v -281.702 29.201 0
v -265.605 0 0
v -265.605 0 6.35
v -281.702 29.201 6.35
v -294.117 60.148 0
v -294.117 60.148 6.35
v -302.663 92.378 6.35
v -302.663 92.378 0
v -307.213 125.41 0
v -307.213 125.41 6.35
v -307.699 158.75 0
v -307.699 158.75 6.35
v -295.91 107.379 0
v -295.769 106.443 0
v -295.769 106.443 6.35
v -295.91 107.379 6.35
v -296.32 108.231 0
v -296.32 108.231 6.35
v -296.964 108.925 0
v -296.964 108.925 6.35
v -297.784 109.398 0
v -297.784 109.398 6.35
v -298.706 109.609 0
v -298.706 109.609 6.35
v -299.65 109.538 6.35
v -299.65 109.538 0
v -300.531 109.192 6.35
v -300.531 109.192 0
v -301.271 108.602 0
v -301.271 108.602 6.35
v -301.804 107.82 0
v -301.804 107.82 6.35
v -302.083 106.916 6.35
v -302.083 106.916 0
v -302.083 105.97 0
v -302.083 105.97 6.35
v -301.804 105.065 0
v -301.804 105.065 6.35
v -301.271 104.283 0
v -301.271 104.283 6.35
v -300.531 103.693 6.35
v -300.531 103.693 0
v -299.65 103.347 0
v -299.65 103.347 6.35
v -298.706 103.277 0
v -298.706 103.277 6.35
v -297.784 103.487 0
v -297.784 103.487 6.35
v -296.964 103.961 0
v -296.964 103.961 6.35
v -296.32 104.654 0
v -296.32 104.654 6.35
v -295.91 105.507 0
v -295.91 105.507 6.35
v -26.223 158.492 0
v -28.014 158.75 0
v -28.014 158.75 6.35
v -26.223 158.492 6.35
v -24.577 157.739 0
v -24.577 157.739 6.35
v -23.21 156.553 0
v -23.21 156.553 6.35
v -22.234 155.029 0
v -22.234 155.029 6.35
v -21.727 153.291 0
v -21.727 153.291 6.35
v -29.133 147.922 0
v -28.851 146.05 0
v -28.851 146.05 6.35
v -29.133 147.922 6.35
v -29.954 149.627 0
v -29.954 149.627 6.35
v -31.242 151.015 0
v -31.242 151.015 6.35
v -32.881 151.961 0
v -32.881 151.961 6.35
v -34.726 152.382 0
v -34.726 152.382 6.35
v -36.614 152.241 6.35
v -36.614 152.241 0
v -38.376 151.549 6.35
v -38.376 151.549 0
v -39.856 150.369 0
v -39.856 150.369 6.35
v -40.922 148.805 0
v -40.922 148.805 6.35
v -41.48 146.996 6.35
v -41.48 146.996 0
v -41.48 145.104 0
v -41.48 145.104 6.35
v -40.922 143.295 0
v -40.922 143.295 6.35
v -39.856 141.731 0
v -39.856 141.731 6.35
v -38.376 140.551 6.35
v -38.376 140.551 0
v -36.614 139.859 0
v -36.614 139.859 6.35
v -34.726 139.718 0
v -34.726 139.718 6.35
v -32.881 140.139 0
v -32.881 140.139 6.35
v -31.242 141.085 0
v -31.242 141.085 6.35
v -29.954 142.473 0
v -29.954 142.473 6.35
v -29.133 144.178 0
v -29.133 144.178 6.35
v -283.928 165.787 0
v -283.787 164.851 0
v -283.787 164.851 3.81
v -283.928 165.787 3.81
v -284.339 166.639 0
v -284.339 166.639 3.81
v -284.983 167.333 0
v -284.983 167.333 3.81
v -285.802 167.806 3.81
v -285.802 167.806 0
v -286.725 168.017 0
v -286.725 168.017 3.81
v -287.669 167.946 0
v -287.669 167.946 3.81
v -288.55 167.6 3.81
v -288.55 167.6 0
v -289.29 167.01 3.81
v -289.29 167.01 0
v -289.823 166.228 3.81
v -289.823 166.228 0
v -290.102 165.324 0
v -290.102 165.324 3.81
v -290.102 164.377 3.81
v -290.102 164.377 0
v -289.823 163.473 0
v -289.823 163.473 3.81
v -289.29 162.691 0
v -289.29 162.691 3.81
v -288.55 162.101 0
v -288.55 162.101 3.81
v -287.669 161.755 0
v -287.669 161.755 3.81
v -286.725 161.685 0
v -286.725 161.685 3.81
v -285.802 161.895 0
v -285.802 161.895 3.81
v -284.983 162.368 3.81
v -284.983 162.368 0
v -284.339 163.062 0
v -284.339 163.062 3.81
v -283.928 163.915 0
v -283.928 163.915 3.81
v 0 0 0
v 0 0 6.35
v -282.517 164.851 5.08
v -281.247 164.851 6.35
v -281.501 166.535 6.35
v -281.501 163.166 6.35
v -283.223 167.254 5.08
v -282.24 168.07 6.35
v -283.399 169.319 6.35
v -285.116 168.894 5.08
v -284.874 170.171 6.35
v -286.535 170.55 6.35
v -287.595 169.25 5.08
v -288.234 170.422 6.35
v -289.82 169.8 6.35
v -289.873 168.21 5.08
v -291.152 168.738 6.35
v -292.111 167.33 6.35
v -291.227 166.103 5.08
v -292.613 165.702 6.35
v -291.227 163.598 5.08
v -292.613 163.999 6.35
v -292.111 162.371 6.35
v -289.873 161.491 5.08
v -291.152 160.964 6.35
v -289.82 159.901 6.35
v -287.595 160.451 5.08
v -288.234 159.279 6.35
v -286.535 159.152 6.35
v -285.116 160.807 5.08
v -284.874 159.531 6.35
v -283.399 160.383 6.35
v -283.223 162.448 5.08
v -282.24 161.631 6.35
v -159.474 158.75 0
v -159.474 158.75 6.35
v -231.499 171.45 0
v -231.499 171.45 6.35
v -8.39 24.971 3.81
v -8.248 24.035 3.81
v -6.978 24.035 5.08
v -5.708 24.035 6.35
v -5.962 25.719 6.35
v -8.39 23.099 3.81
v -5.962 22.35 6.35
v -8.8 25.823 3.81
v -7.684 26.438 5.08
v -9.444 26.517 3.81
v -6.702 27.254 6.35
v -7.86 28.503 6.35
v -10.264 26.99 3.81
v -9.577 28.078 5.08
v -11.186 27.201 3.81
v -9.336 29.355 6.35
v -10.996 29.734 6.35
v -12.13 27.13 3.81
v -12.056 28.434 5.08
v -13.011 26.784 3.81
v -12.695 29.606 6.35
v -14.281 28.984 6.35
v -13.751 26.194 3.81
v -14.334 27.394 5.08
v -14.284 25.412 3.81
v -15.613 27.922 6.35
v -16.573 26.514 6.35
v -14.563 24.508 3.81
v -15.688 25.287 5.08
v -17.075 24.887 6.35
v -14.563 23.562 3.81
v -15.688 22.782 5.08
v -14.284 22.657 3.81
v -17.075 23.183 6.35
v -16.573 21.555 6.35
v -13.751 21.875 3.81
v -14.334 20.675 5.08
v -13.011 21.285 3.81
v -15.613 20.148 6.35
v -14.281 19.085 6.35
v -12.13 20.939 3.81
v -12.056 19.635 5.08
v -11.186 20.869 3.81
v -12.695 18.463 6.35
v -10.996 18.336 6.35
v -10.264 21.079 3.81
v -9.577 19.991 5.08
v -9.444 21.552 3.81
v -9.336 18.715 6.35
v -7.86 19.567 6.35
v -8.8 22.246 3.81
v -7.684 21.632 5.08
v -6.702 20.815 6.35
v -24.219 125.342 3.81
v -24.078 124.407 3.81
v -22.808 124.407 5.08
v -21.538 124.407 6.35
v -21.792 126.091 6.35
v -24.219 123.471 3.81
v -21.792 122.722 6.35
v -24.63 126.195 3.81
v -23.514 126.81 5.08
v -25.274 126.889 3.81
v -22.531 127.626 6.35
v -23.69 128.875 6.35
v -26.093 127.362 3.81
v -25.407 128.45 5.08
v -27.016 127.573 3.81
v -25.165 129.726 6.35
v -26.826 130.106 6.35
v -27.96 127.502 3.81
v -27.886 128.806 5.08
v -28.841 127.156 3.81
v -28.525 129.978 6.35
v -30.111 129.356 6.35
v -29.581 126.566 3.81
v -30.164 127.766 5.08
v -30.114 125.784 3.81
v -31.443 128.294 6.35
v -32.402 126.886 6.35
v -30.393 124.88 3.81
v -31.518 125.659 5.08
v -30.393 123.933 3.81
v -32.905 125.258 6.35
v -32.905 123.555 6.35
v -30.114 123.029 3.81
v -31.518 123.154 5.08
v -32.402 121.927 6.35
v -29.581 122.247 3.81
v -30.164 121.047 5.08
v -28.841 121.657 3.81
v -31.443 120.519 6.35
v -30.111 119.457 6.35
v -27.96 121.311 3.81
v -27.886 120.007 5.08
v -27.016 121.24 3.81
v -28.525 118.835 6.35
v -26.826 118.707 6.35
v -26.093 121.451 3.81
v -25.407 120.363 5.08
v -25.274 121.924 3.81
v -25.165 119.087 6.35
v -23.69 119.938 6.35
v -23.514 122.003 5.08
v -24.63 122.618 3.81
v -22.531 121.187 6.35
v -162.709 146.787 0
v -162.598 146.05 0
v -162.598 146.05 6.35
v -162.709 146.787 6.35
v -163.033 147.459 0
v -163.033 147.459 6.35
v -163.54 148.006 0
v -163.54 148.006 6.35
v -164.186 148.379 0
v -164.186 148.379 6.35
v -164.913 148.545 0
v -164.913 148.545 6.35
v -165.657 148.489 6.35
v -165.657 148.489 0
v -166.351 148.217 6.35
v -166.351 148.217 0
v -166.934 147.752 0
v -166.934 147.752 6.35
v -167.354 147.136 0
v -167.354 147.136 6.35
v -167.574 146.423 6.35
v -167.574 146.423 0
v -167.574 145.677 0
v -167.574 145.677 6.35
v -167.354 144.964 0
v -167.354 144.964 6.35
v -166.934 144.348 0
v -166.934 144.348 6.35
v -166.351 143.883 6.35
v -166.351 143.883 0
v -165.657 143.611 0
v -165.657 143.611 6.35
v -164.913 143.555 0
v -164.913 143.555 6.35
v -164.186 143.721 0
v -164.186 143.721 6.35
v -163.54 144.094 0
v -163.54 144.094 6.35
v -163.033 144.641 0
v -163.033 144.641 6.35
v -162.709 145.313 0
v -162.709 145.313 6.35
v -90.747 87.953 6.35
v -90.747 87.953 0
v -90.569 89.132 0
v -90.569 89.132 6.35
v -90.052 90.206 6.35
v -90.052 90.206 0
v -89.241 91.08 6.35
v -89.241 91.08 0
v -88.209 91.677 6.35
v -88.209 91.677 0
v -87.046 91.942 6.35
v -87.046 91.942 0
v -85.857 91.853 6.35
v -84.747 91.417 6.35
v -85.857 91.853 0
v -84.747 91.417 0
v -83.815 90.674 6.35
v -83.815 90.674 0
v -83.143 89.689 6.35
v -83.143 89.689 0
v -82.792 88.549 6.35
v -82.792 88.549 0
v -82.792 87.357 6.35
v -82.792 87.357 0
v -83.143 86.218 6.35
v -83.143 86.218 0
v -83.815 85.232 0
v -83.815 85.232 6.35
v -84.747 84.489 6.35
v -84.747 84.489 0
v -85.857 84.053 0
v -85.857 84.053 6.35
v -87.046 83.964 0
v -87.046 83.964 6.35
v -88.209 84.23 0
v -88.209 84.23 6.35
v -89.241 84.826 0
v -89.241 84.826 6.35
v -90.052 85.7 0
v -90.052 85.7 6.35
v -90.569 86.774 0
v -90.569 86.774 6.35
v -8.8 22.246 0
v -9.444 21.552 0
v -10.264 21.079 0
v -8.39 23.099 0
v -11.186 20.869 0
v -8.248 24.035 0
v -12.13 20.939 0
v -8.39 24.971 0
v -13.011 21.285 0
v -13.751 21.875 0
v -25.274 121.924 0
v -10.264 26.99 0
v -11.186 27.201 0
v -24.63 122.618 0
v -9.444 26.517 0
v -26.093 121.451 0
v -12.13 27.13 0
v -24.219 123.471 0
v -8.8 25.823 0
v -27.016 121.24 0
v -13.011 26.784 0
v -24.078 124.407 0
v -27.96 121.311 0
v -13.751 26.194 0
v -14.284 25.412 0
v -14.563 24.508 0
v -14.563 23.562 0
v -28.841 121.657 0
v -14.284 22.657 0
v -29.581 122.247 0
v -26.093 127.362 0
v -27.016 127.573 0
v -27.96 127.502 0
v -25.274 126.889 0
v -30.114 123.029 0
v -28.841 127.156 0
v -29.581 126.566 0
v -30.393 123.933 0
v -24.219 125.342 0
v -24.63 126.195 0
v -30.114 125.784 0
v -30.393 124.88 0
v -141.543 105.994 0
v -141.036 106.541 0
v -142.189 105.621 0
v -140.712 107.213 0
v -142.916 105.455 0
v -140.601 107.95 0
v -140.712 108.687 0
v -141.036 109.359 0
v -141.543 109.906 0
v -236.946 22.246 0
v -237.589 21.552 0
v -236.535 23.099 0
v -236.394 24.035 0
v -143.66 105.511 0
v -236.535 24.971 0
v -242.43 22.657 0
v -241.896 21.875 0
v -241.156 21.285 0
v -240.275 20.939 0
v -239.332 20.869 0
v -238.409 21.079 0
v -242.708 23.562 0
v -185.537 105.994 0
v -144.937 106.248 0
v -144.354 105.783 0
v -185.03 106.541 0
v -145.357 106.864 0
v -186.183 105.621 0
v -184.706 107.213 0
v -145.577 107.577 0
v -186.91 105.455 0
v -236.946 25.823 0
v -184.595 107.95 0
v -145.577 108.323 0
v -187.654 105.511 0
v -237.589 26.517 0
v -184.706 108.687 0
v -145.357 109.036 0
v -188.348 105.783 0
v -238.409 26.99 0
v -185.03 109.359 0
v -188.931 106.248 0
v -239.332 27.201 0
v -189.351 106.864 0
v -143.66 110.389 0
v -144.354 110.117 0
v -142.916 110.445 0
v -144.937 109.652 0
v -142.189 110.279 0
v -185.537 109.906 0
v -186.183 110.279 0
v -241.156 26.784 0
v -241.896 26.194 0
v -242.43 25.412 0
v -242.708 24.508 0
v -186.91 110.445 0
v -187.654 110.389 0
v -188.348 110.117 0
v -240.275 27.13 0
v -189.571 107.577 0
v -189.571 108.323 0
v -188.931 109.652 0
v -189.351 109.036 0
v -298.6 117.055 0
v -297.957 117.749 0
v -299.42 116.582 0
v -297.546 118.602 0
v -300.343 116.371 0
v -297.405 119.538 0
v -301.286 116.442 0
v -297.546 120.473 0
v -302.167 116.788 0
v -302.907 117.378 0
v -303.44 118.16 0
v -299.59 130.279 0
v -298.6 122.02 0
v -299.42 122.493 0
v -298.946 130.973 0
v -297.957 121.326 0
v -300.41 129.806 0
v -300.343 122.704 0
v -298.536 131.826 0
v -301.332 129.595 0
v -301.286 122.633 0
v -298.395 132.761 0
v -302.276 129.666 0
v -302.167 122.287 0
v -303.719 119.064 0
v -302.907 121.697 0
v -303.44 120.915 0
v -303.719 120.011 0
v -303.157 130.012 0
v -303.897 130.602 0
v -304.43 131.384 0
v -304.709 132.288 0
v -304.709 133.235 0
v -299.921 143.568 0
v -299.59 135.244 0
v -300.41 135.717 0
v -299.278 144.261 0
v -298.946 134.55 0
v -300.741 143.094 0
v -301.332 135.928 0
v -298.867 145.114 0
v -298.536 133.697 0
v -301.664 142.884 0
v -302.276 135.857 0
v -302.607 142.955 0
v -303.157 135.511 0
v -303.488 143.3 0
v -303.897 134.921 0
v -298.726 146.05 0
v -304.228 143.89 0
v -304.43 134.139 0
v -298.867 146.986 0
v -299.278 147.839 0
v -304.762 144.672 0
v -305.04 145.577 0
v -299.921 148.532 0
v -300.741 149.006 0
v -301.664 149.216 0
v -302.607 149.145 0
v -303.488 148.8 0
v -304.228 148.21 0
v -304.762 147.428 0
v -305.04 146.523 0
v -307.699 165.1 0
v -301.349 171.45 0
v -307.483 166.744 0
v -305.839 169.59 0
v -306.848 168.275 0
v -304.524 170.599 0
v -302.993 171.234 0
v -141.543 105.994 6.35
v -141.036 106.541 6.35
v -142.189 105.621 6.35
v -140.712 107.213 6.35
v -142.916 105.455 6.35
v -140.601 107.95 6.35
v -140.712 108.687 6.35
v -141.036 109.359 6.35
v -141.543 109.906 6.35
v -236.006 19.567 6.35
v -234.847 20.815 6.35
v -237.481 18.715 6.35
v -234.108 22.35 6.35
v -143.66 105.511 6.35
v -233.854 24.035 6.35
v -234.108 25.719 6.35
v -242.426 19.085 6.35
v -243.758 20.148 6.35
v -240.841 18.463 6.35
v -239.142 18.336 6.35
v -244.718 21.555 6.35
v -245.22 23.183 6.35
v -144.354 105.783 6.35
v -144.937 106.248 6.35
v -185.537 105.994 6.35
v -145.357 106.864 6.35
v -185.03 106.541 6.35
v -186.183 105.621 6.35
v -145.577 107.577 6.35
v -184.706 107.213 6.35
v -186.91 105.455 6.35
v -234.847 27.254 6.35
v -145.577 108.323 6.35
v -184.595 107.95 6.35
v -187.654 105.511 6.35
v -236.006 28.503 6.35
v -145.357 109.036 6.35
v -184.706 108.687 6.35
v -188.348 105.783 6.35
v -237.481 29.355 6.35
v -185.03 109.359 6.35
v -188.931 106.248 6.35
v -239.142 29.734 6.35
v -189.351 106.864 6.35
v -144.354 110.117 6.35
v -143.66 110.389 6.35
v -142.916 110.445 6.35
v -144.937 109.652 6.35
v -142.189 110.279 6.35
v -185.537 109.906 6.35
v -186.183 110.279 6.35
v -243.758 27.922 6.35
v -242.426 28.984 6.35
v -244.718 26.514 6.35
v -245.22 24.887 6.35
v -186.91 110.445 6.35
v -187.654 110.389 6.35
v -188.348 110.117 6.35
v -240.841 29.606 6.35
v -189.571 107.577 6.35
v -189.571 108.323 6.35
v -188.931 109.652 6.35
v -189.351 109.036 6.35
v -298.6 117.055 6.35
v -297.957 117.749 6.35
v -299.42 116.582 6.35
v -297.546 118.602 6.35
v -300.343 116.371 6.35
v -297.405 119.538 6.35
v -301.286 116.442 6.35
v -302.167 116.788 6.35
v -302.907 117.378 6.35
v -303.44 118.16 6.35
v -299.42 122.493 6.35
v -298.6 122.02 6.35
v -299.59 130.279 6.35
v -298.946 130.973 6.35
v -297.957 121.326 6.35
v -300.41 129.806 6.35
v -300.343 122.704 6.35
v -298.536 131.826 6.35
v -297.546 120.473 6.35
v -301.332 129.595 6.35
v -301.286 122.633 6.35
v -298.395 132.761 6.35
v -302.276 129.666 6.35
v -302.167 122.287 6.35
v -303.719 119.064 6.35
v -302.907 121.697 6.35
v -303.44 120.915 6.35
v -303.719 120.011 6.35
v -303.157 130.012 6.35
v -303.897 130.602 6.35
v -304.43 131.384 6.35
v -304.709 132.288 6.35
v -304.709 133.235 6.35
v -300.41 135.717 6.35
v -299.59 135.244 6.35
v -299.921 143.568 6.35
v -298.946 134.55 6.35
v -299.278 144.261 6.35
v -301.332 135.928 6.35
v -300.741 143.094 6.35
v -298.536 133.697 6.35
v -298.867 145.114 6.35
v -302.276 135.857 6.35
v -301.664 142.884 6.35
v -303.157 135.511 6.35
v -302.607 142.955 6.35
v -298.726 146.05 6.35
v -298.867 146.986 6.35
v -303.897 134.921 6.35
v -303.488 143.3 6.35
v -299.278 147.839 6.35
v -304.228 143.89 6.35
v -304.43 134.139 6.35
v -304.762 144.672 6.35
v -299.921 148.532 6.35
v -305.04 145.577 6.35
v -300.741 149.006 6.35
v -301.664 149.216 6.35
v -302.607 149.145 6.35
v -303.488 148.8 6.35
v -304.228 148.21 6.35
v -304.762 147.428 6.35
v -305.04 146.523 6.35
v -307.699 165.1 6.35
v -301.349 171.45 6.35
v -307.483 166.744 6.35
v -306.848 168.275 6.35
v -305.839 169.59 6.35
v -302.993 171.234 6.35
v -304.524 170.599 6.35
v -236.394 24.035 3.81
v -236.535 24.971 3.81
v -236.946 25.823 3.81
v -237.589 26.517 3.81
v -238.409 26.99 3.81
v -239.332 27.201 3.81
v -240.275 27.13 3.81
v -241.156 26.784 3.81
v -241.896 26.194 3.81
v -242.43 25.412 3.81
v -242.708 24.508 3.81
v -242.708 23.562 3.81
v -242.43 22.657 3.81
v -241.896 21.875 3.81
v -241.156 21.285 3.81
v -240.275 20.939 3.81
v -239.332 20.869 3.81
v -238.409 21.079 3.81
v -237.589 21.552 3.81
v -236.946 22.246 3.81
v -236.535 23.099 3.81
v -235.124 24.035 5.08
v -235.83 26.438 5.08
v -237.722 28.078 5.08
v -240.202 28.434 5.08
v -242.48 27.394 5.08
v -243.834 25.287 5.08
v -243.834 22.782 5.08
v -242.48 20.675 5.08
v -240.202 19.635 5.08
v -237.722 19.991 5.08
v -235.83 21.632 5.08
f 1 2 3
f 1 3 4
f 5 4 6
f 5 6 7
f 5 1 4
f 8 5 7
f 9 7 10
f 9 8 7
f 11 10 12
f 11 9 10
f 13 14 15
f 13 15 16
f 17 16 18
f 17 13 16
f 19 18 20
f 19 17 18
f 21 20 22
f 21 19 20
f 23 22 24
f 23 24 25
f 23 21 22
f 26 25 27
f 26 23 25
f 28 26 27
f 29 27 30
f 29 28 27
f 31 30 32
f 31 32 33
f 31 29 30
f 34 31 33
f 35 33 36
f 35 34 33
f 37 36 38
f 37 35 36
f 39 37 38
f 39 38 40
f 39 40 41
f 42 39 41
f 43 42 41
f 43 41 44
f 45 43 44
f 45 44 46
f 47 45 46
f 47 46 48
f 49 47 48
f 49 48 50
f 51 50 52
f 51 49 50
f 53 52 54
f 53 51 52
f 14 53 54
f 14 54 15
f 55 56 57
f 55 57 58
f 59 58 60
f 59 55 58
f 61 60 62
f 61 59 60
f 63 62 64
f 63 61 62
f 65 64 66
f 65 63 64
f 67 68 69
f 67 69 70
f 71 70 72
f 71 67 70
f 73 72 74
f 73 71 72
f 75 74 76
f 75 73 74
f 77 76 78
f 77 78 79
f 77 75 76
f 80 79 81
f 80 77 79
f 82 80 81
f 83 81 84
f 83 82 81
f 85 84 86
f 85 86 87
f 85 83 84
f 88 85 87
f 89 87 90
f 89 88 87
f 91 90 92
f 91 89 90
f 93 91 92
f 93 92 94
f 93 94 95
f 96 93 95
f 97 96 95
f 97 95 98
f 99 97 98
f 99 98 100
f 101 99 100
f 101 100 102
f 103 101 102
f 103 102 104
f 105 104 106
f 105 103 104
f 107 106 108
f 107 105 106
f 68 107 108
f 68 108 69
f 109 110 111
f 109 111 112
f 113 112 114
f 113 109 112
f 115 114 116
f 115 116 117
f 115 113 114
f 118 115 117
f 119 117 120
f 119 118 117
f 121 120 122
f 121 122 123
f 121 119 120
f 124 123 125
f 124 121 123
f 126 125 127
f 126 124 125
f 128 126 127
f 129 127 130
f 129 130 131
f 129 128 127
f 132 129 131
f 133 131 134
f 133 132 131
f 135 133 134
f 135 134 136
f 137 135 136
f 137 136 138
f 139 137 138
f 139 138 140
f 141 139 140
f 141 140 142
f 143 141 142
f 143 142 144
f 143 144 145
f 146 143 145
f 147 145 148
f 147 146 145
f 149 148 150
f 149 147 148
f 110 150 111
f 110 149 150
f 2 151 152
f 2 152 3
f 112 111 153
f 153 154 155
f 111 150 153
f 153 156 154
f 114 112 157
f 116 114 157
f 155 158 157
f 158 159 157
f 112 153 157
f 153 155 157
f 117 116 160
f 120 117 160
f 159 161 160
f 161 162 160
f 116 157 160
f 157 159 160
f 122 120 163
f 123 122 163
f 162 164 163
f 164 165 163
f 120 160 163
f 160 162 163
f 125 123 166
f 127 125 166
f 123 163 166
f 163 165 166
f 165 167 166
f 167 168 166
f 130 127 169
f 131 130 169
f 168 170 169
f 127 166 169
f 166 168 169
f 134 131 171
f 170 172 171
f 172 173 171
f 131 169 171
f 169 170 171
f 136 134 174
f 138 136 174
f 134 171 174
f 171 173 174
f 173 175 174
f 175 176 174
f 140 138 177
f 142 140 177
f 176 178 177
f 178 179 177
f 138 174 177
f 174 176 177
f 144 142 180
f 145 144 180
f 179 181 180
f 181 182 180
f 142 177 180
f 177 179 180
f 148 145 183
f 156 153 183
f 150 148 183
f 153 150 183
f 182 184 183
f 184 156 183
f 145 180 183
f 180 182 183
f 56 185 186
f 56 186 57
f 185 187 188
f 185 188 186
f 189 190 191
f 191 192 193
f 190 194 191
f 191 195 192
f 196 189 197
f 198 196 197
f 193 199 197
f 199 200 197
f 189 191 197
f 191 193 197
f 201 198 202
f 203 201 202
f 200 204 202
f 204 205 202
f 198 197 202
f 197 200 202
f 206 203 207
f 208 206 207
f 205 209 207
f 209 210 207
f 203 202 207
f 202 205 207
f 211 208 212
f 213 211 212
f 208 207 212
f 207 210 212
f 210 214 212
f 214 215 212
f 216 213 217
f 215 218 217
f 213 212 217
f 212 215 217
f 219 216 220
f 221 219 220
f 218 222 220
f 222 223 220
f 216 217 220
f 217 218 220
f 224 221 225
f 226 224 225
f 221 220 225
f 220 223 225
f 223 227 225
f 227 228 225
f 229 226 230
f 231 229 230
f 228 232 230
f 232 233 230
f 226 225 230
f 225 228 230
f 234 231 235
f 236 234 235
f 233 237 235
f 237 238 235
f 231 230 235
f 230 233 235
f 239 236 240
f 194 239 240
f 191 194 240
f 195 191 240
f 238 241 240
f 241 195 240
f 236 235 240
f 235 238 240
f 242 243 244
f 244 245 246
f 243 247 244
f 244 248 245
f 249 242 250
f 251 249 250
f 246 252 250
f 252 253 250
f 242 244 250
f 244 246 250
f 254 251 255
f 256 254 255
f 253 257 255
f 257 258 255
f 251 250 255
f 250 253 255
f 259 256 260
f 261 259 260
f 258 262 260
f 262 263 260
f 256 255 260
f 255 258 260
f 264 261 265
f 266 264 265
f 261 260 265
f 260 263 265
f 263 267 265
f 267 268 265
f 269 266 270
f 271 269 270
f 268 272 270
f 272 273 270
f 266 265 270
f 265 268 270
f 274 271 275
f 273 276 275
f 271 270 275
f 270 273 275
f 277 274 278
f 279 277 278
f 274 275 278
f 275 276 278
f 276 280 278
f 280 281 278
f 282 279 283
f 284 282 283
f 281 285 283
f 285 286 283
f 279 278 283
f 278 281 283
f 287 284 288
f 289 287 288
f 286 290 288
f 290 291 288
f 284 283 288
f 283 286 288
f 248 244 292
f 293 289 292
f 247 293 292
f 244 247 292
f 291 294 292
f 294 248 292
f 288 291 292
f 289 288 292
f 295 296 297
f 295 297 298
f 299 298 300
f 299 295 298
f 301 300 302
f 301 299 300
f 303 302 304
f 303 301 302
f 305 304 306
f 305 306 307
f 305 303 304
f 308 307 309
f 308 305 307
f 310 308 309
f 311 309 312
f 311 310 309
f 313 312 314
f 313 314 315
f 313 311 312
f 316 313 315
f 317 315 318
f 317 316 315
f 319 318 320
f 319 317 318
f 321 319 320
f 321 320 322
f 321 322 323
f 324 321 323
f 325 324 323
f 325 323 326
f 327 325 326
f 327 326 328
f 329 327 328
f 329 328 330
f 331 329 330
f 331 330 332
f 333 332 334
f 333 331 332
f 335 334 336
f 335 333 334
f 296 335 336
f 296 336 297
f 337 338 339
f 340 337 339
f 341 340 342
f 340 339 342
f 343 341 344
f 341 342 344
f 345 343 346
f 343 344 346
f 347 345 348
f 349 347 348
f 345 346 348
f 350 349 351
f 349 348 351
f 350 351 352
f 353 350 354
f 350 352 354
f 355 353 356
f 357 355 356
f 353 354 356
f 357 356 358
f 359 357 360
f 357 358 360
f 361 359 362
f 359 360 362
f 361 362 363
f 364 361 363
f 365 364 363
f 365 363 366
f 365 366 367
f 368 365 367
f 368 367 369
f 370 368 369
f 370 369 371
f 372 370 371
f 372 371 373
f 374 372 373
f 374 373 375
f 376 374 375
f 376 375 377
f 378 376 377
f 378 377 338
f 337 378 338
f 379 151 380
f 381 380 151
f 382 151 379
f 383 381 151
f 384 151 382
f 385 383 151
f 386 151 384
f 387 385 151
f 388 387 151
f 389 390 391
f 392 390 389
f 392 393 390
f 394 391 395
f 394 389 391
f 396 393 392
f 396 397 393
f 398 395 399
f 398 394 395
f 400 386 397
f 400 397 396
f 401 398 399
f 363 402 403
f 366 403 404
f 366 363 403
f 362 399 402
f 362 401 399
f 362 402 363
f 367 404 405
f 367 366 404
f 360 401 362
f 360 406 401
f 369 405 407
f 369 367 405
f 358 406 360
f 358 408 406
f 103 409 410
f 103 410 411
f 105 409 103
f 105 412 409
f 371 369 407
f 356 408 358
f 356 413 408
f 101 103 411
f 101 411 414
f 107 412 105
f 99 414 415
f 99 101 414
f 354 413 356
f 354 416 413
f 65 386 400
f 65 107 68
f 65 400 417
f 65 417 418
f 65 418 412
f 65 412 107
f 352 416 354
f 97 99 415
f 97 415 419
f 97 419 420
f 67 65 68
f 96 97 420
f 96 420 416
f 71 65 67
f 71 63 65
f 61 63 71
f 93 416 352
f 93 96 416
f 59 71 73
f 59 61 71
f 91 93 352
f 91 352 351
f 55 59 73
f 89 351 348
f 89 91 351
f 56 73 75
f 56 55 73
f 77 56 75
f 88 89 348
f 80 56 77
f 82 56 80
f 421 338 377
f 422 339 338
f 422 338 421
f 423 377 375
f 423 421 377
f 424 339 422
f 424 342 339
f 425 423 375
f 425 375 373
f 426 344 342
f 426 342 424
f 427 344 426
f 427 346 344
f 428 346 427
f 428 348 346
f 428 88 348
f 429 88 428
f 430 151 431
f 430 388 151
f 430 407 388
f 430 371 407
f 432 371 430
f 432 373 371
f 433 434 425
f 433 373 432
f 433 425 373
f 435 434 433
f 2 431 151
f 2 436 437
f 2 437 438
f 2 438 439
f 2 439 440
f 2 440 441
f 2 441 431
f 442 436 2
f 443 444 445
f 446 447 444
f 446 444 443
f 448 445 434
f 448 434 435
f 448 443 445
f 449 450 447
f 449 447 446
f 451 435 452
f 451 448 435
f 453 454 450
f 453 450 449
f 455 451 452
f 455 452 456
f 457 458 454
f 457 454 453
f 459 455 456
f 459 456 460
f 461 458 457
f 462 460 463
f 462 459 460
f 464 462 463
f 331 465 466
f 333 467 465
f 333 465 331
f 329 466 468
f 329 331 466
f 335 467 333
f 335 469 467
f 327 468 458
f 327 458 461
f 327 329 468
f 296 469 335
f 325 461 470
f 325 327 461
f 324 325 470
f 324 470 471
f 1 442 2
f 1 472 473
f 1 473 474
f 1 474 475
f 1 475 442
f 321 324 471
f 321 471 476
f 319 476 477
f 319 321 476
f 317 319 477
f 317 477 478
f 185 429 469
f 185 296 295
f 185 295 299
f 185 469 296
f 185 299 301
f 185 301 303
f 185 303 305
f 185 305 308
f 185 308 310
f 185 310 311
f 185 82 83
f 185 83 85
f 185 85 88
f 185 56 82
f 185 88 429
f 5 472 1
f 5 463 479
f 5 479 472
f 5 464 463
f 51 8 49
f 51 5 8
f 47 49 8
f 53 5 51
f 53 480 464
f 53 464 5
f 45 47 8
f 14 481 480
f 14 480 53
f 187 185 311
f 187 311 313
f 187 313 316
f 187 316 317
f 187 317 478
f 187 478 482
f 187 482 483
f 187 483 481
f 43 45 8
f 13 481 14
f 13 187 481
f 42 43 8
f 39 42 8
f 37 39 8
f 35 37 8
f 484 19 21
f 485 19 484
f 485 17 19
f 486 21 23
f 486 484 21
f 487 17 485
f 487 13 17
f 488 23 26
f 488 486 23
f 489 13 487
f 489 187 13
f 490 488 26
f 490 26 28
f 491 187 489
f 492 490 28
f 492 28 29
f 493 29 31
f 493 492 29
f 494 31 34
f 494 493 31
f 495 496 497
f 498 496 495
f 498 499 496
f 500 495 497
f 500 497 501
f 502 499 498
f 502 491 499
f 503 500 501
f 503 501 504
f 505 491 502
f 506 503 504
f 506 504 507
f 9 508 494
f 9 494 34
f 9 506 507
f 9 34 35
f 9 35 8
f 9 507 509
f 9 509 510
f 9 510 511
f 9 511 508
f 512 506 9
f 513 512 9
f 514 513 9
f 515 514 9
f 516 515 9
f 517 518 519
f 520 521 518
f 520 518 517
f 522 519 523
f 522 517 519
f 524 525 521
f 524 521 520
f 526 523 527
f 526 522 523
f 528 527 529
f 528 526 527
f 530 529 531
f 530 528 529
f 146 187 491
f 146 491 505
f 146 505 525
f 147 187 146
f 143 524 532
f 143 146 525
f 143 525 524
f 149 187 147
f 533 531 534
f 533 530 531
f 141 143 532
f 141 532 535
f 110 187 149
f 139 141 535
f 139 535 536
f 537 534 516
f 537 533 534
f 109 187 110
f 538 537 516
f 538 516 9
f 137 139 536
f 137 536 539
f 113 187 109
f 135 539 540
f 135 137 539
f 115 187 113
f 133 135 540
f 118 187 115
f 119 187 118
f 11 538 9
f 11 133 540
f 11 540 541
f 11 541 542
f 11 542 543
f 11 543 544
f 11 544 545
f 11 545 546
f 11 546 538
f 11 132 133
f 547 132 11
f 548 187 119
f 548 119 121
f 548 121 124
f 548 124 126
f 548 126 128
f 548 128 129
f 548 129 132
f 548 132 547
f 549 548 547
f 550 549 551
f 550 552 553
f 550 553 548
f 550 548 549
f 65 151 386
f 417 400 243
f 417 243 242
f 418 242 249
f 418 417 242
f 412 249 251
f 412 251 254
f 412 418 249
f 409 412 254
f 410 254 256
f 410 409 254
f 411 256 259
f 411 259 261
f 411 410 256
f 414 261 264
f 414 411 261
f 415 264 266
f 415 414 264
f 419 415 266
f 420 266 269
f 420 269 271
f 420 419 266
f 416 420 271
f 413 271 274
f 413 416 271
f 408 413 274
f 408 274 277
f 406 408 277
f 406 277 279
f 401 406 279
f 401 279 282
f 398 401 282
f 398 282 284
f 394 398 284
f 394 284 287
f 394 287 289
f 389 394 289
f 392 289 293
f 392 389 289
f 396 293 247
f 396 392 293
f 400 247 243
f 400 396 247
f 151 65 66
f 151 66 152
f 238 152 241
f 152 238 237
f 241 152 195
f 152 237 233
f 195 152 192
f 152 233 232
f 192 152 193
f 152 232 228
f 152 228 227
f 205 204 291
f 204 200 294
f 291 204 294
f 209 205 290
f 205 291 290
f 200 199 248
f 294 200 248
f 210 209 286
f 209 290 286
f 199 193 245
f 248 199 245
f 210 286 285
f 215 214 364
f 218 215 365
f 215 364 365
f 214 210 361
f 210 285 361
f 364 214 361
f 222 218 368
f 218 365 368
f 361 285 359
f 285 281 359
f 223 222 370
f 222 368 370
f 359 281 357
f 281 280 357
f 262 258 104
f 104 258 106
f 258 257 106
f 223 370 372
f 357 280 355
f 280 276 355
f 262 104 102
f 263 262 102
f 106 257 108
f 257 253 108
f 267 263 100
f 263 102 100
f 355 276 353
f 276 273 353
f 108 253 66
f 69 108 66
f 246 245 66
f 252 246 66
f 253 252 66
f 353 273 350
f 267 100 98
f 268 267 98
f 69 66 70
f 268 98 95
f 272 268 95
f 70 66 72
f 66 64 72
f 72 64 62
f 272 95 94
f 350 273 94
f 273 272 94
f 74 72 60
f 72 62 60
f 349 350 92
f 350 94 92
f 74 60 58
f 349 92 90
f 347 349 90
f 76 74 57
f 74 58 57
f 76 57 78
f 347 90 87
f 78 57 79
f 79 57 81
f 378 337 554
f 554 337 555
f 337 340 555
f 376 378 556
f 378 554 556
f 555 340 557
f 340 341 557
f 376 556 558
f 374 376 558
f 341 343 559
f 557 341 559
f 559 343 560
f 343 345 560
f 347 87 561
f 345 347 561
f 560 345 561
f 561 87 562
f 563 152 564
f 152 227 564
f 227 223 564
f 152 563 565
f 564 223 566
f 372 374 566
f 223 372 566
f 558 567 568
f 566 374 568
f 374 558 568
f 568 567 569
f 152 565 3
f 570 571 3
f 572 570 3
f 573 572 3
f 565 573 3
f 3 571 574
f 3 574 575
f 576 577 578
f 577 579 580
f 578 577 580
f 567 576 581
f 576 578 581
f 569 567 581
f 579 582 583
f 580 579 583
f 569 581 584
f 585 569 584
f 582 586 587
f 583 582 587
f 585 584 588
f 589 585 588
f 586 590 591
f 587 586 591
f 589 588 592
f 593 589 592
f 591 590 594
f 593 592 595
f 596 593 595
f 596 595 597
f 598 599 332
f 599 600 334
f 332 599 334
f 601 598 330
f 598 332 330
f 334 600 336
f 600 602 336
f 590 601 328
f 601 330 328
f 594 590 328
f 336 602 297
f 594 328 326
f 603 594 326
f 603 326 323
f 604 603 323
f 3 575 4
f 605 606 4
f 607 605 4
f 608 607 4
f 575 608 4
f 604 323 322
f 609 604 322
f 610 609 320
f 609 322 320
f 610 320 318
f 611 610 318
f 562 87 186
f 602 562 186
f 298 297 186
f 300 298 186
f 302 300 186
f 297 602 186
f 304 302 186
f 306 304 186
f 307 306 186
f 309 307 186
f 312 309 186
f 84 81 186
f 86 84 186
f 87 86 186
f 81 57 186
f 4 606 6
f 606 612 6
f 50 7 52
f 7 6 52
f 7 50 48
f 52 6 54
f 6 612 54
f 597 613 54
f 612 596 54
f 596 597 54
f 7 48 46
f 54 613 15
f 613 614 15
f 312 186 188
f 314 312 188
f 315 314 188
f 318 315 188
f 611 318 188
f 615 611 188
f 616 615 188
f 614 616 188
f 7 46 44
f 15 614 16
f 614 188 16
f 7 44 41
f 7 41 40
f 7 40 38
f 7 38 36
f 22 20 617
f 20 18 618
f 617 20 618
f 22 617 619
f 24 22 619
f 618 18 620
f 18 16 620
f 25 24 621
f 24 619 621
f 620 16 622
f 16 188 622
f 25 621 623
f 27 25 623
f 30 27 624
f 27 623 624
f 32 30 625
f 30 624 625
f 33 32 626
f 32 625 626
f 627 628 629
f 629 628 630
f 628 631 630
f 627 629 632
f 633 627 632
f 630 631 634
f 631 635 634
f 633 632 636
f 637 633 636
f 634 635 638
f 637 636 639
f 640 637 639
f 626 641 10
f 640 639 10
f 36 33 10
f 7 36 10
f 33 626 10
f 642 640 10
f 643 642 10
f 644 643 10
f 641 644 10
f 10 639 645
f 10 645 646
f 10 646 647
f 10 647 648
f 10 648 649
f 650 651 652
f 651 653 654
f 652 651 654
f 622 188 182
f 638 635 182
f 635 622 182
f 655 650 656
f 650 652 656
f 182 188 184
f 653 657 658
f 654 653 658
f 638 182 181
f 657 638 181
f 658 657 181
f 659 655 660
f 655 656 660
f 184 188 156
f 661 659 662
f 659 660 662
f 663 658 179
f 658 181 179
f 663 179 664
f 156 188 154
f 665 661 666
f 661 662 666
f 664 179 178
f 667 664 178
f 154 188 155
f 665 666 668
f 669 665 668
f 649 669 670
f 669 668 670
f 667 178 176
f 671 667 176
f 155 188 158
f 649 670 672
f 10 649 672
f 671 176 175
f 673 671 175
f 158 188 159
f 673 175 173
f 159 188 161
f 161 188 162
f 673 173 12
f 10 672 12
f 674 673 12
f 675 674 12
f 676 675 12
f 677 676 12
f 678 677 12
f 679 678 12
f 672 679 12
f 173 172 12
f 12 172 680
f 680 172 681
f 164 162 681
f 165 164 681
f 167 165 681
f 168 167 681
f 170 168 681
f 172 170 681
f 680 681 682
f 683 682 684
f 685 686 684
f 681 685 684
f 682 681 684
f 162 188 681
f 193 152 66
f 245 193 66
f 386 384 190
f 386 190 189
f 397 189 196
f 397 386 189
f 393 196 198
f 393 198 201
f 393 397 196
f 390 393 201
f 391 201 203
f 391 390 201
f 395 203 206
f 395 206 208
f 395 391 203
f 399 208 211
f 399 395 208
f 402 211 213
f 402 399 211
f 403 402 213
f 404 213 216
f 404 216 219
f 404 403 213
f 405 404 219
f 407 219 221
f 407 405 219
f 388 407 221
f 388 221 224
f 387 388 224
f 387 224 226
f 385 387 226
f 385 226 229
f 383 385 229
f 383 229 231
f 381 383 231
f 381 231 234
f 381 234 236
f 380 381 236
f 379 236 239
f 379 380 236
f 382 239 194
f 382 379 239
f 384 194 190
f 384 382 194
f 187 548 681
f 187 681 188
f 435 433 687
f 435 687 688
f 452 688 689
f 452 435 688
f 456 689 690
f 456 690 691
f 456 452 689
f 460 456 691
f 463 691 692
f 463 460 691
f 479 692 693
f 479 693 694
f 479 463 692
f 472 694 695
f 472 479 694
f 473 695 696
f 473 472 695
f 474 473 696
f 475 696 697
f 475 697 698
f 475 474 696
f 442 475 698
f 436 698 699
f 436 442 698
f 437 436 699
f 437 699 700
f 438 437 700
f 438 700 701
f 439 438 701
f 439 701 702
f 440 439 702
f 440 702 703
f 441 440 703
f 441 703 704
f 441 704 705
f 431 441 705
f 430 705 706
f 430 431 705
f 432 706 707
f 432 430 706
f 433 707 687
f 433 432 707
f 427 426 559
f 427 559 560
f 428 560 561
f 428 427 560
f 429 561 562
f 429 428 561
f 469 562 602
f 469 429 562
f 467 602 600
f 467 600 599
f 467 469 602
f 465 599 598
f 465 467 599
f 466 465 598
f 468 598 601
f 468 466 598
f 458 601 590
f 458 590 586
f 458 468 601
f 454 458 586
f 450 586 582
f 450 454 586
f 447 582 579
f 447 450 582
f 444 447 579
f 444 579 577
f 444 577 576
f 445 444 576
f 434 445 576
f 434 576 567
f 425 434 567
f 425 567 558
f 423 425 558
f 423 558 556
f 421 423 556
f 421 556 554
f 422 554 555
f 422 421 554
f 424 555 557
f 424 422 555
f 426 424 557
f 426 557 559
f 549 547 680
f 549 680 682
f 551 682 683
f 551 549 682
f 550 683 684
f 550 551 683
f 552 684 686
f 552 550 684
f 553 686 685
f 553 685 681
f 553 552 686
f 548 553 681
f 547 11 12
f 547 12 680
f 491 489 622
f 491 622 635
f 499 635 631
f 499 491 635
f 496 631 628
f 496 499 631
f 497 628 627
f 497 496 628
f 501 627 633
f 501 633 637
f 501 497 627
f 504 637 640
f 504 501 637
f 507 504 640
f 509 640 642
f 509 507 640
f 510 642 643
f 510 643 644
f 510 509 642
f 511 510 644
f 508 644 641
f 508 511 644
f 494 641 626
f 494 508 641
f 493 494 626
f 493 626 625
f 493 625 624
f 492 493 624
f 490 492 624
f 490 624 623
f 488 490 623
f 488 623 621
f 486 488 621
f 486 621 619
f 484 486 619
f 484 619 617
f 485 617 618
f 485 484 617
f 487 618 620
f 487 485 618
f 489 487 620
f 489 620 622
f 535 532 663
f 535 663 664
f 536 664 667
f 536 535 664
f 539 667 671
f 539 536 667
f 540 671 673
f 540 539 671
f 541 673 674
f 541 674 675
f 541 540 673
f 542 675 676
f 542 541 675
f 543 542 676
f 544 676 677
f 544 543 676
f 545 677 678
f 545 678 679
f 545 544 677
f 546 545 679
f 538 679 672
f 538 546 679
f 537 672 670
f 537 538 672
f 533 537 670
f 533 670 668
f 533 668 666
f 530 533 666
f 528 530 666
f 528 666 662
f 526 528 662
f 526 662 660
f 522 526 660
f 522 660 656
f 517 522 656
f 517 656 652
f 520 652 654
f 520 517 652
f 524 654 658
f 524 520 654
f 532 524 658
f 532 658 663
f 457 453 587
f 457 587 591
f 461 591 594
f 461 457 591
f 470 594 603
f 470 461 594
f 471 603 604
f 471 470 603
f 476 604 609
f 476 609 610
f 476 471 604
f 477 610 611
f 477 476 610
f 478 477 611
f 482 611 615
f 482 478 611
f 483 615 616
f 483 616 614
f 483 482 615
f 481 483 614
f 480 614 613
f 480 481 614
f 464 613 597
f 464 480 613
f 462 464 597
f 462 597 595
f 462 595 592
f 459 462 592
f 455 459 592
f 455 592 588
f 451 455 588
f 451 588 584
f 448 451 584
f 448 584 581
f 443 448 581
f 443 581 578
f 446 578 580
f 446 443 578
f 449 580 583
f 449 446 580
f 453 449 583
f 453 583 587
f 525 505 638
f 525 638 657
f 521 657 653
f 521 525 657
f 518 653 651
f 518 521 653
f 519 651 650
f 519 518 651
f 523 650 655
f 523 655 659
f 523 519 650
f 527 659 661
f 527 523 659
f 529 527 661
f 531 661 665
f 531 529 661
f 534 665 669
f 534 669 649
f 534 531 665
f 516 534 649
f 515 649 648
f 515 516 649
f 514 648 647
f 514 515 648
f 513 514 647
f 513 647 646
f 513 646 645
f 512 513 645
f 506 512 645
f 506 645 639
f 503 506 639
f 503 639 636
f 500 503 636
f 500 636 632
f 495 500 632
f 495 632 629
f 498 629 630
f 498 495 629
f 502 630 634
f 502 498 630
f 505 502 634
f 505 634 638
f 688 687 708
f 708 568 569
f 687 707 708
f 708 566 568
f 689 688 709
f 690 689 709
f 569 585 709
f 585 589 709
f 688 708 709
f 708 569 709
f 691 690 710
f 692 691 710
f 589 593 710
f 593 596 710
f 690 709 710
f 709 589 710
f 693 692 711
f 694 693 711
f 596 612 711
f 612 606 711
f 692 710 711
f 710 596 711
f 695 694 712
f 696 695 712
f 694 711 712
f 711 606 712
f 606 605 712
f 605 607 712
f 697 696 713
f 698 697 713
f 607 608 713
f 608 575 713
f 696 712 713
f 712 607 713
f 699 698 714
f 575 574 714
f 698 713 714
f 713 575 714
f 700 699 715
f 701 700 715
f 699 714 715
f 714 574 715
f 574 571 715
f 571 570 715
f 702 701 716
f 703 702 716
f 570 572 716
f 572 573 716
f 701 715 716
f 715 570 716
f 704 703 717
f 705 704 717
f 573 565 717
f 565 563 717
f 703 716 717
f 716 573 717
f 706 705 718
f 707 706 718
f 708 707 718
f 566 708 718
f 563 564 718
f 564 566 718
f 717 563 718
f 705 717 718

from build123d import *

# Parameters (mm, degrees)
SKETCH18_R          = 3.175
SKETCH18_R_2        = 6.35
SKETCH18_R_3        = 2.5019
BOSS_EXTRUDE4_DEPTH = 6.35
CHAMFER1_SIZE       = 2.54
SKETCH19_R          = 4
CUT_EXTRUDE1_DEPTH  = 43.434


with BuildPart() as part:
    # Sketch18 → Boss-Extrude4 (new body)
    with BuildSketch(Plane.XY):
        with BuildLine():
            Line((0, 0), (-265.604745697, 0))
            ThreePointArc((-265.604745697, 0), (-298.882523776, 76.131915965), (-307.699061234, 158.75))
            Line((-307.699061234, 158.75), (-307.699061234, 165.1))
            ThreePointArc((-307.699061234, 165.1), (-305.839189294, 169.590128061), (-301.349061234, 171.45))
            Line((-301.349061234, 171.45), (-231.499061234, 171.45))
            Line((-231.499061234, 171.45), (-159.473782125, 158.75))
            Line((-159.473782125, 158.75), (-28.014368889, 158.75))
            ThreePointArc((-28.014368889, 158.75), (-23.851207857, 157.194850386), (-21.727208485, 153.291130779))
            Line((-21.727208485, 153.291130779), (0, 0))
        make_face()
        with Locations((-11.423473622, 24.034728138)):
            Circle(SKETCH18_R, mode=Mode.SUBTRACT)
        with Locations((-27.253356194, 124.406511892)):
            Circle(SKETCH18_R, mode=Mode.SUBTRACT)
        with Locations((-35.200938766, 146.05)):
            Circle(SKETCH18_R_2, mode=Mode.SUBTRACT)
        with Locations((-301.900938766, 146.05)):
            Circle(SKETCH18_R, mode=Mode.SUBTRACT)
        with Locations((-301.569673588, 132.761391752)):
            Circle(SKETCH18_R, mode=Mode.SUBTRACT)
        with Locations((-300.579872803, 119.537524267)):
            Circle(SKETCH18_R, mode=Mode.SUBTRACT)
        with Locations((-298.943543444, 106.442822899)):
            Circle(SKETCH18_R, mode=Mode.SUBTRACT)
        with Locations((-239.568937637, 24.034728138)):
            Circle(SKETCH18_R, mode=Mode.SUBTRACT)
        with Locations((-286.962142025, 164.850708953)):
            Circle(SKETCH18_R, mode=Mode.SUBTRACT)
        with Locations((-165.1, 146.05)):
            Circle(SKETCH18_R_3, mode=Mode.SUBTRACT)
        with Locations((-143.102954744, 107.95)):
            Circle(SKETCH18_R_3, mode=Mode.SUBTRACT)
        with Locations((-187.097045256, 107.95)):
            Circle(SKETCH18_R_3, mode=Mode.SUBTRACT)
    extrude(amount=BOSS_EXTRUDE4_DEPTH)

    # Chamfer1
    chamfer1_edges = [part.edges().sort_by_distance(p)[0] for p in [
        (-14.598473622, 24.034728138, 6.35),
        (-30.428356194, 124.406511892, 6.35),
        (-242.743937637, 24.034728138, 6.35),
        (-290.137142025, 164.850708953, 6.35),
    ]]
    chamfer(chamfer1_edges, length=CHAMFER1_SIZE)

    # Sketch19 → Cut-Extrude1 (cut)
    with BuildSketch(Plane(origin=(0, 0, 0), x_dir=(-1, 0, 0), z_dir=(0, 0, -1))):
        with Locations((86.747156029, 87.953133026)):
            Circle(SKETCH19_R)
    extrude(amount=-CUT_EXTRUDE1_DEPTH, mode=Mode.SUBTRACT)


solid = part.part
